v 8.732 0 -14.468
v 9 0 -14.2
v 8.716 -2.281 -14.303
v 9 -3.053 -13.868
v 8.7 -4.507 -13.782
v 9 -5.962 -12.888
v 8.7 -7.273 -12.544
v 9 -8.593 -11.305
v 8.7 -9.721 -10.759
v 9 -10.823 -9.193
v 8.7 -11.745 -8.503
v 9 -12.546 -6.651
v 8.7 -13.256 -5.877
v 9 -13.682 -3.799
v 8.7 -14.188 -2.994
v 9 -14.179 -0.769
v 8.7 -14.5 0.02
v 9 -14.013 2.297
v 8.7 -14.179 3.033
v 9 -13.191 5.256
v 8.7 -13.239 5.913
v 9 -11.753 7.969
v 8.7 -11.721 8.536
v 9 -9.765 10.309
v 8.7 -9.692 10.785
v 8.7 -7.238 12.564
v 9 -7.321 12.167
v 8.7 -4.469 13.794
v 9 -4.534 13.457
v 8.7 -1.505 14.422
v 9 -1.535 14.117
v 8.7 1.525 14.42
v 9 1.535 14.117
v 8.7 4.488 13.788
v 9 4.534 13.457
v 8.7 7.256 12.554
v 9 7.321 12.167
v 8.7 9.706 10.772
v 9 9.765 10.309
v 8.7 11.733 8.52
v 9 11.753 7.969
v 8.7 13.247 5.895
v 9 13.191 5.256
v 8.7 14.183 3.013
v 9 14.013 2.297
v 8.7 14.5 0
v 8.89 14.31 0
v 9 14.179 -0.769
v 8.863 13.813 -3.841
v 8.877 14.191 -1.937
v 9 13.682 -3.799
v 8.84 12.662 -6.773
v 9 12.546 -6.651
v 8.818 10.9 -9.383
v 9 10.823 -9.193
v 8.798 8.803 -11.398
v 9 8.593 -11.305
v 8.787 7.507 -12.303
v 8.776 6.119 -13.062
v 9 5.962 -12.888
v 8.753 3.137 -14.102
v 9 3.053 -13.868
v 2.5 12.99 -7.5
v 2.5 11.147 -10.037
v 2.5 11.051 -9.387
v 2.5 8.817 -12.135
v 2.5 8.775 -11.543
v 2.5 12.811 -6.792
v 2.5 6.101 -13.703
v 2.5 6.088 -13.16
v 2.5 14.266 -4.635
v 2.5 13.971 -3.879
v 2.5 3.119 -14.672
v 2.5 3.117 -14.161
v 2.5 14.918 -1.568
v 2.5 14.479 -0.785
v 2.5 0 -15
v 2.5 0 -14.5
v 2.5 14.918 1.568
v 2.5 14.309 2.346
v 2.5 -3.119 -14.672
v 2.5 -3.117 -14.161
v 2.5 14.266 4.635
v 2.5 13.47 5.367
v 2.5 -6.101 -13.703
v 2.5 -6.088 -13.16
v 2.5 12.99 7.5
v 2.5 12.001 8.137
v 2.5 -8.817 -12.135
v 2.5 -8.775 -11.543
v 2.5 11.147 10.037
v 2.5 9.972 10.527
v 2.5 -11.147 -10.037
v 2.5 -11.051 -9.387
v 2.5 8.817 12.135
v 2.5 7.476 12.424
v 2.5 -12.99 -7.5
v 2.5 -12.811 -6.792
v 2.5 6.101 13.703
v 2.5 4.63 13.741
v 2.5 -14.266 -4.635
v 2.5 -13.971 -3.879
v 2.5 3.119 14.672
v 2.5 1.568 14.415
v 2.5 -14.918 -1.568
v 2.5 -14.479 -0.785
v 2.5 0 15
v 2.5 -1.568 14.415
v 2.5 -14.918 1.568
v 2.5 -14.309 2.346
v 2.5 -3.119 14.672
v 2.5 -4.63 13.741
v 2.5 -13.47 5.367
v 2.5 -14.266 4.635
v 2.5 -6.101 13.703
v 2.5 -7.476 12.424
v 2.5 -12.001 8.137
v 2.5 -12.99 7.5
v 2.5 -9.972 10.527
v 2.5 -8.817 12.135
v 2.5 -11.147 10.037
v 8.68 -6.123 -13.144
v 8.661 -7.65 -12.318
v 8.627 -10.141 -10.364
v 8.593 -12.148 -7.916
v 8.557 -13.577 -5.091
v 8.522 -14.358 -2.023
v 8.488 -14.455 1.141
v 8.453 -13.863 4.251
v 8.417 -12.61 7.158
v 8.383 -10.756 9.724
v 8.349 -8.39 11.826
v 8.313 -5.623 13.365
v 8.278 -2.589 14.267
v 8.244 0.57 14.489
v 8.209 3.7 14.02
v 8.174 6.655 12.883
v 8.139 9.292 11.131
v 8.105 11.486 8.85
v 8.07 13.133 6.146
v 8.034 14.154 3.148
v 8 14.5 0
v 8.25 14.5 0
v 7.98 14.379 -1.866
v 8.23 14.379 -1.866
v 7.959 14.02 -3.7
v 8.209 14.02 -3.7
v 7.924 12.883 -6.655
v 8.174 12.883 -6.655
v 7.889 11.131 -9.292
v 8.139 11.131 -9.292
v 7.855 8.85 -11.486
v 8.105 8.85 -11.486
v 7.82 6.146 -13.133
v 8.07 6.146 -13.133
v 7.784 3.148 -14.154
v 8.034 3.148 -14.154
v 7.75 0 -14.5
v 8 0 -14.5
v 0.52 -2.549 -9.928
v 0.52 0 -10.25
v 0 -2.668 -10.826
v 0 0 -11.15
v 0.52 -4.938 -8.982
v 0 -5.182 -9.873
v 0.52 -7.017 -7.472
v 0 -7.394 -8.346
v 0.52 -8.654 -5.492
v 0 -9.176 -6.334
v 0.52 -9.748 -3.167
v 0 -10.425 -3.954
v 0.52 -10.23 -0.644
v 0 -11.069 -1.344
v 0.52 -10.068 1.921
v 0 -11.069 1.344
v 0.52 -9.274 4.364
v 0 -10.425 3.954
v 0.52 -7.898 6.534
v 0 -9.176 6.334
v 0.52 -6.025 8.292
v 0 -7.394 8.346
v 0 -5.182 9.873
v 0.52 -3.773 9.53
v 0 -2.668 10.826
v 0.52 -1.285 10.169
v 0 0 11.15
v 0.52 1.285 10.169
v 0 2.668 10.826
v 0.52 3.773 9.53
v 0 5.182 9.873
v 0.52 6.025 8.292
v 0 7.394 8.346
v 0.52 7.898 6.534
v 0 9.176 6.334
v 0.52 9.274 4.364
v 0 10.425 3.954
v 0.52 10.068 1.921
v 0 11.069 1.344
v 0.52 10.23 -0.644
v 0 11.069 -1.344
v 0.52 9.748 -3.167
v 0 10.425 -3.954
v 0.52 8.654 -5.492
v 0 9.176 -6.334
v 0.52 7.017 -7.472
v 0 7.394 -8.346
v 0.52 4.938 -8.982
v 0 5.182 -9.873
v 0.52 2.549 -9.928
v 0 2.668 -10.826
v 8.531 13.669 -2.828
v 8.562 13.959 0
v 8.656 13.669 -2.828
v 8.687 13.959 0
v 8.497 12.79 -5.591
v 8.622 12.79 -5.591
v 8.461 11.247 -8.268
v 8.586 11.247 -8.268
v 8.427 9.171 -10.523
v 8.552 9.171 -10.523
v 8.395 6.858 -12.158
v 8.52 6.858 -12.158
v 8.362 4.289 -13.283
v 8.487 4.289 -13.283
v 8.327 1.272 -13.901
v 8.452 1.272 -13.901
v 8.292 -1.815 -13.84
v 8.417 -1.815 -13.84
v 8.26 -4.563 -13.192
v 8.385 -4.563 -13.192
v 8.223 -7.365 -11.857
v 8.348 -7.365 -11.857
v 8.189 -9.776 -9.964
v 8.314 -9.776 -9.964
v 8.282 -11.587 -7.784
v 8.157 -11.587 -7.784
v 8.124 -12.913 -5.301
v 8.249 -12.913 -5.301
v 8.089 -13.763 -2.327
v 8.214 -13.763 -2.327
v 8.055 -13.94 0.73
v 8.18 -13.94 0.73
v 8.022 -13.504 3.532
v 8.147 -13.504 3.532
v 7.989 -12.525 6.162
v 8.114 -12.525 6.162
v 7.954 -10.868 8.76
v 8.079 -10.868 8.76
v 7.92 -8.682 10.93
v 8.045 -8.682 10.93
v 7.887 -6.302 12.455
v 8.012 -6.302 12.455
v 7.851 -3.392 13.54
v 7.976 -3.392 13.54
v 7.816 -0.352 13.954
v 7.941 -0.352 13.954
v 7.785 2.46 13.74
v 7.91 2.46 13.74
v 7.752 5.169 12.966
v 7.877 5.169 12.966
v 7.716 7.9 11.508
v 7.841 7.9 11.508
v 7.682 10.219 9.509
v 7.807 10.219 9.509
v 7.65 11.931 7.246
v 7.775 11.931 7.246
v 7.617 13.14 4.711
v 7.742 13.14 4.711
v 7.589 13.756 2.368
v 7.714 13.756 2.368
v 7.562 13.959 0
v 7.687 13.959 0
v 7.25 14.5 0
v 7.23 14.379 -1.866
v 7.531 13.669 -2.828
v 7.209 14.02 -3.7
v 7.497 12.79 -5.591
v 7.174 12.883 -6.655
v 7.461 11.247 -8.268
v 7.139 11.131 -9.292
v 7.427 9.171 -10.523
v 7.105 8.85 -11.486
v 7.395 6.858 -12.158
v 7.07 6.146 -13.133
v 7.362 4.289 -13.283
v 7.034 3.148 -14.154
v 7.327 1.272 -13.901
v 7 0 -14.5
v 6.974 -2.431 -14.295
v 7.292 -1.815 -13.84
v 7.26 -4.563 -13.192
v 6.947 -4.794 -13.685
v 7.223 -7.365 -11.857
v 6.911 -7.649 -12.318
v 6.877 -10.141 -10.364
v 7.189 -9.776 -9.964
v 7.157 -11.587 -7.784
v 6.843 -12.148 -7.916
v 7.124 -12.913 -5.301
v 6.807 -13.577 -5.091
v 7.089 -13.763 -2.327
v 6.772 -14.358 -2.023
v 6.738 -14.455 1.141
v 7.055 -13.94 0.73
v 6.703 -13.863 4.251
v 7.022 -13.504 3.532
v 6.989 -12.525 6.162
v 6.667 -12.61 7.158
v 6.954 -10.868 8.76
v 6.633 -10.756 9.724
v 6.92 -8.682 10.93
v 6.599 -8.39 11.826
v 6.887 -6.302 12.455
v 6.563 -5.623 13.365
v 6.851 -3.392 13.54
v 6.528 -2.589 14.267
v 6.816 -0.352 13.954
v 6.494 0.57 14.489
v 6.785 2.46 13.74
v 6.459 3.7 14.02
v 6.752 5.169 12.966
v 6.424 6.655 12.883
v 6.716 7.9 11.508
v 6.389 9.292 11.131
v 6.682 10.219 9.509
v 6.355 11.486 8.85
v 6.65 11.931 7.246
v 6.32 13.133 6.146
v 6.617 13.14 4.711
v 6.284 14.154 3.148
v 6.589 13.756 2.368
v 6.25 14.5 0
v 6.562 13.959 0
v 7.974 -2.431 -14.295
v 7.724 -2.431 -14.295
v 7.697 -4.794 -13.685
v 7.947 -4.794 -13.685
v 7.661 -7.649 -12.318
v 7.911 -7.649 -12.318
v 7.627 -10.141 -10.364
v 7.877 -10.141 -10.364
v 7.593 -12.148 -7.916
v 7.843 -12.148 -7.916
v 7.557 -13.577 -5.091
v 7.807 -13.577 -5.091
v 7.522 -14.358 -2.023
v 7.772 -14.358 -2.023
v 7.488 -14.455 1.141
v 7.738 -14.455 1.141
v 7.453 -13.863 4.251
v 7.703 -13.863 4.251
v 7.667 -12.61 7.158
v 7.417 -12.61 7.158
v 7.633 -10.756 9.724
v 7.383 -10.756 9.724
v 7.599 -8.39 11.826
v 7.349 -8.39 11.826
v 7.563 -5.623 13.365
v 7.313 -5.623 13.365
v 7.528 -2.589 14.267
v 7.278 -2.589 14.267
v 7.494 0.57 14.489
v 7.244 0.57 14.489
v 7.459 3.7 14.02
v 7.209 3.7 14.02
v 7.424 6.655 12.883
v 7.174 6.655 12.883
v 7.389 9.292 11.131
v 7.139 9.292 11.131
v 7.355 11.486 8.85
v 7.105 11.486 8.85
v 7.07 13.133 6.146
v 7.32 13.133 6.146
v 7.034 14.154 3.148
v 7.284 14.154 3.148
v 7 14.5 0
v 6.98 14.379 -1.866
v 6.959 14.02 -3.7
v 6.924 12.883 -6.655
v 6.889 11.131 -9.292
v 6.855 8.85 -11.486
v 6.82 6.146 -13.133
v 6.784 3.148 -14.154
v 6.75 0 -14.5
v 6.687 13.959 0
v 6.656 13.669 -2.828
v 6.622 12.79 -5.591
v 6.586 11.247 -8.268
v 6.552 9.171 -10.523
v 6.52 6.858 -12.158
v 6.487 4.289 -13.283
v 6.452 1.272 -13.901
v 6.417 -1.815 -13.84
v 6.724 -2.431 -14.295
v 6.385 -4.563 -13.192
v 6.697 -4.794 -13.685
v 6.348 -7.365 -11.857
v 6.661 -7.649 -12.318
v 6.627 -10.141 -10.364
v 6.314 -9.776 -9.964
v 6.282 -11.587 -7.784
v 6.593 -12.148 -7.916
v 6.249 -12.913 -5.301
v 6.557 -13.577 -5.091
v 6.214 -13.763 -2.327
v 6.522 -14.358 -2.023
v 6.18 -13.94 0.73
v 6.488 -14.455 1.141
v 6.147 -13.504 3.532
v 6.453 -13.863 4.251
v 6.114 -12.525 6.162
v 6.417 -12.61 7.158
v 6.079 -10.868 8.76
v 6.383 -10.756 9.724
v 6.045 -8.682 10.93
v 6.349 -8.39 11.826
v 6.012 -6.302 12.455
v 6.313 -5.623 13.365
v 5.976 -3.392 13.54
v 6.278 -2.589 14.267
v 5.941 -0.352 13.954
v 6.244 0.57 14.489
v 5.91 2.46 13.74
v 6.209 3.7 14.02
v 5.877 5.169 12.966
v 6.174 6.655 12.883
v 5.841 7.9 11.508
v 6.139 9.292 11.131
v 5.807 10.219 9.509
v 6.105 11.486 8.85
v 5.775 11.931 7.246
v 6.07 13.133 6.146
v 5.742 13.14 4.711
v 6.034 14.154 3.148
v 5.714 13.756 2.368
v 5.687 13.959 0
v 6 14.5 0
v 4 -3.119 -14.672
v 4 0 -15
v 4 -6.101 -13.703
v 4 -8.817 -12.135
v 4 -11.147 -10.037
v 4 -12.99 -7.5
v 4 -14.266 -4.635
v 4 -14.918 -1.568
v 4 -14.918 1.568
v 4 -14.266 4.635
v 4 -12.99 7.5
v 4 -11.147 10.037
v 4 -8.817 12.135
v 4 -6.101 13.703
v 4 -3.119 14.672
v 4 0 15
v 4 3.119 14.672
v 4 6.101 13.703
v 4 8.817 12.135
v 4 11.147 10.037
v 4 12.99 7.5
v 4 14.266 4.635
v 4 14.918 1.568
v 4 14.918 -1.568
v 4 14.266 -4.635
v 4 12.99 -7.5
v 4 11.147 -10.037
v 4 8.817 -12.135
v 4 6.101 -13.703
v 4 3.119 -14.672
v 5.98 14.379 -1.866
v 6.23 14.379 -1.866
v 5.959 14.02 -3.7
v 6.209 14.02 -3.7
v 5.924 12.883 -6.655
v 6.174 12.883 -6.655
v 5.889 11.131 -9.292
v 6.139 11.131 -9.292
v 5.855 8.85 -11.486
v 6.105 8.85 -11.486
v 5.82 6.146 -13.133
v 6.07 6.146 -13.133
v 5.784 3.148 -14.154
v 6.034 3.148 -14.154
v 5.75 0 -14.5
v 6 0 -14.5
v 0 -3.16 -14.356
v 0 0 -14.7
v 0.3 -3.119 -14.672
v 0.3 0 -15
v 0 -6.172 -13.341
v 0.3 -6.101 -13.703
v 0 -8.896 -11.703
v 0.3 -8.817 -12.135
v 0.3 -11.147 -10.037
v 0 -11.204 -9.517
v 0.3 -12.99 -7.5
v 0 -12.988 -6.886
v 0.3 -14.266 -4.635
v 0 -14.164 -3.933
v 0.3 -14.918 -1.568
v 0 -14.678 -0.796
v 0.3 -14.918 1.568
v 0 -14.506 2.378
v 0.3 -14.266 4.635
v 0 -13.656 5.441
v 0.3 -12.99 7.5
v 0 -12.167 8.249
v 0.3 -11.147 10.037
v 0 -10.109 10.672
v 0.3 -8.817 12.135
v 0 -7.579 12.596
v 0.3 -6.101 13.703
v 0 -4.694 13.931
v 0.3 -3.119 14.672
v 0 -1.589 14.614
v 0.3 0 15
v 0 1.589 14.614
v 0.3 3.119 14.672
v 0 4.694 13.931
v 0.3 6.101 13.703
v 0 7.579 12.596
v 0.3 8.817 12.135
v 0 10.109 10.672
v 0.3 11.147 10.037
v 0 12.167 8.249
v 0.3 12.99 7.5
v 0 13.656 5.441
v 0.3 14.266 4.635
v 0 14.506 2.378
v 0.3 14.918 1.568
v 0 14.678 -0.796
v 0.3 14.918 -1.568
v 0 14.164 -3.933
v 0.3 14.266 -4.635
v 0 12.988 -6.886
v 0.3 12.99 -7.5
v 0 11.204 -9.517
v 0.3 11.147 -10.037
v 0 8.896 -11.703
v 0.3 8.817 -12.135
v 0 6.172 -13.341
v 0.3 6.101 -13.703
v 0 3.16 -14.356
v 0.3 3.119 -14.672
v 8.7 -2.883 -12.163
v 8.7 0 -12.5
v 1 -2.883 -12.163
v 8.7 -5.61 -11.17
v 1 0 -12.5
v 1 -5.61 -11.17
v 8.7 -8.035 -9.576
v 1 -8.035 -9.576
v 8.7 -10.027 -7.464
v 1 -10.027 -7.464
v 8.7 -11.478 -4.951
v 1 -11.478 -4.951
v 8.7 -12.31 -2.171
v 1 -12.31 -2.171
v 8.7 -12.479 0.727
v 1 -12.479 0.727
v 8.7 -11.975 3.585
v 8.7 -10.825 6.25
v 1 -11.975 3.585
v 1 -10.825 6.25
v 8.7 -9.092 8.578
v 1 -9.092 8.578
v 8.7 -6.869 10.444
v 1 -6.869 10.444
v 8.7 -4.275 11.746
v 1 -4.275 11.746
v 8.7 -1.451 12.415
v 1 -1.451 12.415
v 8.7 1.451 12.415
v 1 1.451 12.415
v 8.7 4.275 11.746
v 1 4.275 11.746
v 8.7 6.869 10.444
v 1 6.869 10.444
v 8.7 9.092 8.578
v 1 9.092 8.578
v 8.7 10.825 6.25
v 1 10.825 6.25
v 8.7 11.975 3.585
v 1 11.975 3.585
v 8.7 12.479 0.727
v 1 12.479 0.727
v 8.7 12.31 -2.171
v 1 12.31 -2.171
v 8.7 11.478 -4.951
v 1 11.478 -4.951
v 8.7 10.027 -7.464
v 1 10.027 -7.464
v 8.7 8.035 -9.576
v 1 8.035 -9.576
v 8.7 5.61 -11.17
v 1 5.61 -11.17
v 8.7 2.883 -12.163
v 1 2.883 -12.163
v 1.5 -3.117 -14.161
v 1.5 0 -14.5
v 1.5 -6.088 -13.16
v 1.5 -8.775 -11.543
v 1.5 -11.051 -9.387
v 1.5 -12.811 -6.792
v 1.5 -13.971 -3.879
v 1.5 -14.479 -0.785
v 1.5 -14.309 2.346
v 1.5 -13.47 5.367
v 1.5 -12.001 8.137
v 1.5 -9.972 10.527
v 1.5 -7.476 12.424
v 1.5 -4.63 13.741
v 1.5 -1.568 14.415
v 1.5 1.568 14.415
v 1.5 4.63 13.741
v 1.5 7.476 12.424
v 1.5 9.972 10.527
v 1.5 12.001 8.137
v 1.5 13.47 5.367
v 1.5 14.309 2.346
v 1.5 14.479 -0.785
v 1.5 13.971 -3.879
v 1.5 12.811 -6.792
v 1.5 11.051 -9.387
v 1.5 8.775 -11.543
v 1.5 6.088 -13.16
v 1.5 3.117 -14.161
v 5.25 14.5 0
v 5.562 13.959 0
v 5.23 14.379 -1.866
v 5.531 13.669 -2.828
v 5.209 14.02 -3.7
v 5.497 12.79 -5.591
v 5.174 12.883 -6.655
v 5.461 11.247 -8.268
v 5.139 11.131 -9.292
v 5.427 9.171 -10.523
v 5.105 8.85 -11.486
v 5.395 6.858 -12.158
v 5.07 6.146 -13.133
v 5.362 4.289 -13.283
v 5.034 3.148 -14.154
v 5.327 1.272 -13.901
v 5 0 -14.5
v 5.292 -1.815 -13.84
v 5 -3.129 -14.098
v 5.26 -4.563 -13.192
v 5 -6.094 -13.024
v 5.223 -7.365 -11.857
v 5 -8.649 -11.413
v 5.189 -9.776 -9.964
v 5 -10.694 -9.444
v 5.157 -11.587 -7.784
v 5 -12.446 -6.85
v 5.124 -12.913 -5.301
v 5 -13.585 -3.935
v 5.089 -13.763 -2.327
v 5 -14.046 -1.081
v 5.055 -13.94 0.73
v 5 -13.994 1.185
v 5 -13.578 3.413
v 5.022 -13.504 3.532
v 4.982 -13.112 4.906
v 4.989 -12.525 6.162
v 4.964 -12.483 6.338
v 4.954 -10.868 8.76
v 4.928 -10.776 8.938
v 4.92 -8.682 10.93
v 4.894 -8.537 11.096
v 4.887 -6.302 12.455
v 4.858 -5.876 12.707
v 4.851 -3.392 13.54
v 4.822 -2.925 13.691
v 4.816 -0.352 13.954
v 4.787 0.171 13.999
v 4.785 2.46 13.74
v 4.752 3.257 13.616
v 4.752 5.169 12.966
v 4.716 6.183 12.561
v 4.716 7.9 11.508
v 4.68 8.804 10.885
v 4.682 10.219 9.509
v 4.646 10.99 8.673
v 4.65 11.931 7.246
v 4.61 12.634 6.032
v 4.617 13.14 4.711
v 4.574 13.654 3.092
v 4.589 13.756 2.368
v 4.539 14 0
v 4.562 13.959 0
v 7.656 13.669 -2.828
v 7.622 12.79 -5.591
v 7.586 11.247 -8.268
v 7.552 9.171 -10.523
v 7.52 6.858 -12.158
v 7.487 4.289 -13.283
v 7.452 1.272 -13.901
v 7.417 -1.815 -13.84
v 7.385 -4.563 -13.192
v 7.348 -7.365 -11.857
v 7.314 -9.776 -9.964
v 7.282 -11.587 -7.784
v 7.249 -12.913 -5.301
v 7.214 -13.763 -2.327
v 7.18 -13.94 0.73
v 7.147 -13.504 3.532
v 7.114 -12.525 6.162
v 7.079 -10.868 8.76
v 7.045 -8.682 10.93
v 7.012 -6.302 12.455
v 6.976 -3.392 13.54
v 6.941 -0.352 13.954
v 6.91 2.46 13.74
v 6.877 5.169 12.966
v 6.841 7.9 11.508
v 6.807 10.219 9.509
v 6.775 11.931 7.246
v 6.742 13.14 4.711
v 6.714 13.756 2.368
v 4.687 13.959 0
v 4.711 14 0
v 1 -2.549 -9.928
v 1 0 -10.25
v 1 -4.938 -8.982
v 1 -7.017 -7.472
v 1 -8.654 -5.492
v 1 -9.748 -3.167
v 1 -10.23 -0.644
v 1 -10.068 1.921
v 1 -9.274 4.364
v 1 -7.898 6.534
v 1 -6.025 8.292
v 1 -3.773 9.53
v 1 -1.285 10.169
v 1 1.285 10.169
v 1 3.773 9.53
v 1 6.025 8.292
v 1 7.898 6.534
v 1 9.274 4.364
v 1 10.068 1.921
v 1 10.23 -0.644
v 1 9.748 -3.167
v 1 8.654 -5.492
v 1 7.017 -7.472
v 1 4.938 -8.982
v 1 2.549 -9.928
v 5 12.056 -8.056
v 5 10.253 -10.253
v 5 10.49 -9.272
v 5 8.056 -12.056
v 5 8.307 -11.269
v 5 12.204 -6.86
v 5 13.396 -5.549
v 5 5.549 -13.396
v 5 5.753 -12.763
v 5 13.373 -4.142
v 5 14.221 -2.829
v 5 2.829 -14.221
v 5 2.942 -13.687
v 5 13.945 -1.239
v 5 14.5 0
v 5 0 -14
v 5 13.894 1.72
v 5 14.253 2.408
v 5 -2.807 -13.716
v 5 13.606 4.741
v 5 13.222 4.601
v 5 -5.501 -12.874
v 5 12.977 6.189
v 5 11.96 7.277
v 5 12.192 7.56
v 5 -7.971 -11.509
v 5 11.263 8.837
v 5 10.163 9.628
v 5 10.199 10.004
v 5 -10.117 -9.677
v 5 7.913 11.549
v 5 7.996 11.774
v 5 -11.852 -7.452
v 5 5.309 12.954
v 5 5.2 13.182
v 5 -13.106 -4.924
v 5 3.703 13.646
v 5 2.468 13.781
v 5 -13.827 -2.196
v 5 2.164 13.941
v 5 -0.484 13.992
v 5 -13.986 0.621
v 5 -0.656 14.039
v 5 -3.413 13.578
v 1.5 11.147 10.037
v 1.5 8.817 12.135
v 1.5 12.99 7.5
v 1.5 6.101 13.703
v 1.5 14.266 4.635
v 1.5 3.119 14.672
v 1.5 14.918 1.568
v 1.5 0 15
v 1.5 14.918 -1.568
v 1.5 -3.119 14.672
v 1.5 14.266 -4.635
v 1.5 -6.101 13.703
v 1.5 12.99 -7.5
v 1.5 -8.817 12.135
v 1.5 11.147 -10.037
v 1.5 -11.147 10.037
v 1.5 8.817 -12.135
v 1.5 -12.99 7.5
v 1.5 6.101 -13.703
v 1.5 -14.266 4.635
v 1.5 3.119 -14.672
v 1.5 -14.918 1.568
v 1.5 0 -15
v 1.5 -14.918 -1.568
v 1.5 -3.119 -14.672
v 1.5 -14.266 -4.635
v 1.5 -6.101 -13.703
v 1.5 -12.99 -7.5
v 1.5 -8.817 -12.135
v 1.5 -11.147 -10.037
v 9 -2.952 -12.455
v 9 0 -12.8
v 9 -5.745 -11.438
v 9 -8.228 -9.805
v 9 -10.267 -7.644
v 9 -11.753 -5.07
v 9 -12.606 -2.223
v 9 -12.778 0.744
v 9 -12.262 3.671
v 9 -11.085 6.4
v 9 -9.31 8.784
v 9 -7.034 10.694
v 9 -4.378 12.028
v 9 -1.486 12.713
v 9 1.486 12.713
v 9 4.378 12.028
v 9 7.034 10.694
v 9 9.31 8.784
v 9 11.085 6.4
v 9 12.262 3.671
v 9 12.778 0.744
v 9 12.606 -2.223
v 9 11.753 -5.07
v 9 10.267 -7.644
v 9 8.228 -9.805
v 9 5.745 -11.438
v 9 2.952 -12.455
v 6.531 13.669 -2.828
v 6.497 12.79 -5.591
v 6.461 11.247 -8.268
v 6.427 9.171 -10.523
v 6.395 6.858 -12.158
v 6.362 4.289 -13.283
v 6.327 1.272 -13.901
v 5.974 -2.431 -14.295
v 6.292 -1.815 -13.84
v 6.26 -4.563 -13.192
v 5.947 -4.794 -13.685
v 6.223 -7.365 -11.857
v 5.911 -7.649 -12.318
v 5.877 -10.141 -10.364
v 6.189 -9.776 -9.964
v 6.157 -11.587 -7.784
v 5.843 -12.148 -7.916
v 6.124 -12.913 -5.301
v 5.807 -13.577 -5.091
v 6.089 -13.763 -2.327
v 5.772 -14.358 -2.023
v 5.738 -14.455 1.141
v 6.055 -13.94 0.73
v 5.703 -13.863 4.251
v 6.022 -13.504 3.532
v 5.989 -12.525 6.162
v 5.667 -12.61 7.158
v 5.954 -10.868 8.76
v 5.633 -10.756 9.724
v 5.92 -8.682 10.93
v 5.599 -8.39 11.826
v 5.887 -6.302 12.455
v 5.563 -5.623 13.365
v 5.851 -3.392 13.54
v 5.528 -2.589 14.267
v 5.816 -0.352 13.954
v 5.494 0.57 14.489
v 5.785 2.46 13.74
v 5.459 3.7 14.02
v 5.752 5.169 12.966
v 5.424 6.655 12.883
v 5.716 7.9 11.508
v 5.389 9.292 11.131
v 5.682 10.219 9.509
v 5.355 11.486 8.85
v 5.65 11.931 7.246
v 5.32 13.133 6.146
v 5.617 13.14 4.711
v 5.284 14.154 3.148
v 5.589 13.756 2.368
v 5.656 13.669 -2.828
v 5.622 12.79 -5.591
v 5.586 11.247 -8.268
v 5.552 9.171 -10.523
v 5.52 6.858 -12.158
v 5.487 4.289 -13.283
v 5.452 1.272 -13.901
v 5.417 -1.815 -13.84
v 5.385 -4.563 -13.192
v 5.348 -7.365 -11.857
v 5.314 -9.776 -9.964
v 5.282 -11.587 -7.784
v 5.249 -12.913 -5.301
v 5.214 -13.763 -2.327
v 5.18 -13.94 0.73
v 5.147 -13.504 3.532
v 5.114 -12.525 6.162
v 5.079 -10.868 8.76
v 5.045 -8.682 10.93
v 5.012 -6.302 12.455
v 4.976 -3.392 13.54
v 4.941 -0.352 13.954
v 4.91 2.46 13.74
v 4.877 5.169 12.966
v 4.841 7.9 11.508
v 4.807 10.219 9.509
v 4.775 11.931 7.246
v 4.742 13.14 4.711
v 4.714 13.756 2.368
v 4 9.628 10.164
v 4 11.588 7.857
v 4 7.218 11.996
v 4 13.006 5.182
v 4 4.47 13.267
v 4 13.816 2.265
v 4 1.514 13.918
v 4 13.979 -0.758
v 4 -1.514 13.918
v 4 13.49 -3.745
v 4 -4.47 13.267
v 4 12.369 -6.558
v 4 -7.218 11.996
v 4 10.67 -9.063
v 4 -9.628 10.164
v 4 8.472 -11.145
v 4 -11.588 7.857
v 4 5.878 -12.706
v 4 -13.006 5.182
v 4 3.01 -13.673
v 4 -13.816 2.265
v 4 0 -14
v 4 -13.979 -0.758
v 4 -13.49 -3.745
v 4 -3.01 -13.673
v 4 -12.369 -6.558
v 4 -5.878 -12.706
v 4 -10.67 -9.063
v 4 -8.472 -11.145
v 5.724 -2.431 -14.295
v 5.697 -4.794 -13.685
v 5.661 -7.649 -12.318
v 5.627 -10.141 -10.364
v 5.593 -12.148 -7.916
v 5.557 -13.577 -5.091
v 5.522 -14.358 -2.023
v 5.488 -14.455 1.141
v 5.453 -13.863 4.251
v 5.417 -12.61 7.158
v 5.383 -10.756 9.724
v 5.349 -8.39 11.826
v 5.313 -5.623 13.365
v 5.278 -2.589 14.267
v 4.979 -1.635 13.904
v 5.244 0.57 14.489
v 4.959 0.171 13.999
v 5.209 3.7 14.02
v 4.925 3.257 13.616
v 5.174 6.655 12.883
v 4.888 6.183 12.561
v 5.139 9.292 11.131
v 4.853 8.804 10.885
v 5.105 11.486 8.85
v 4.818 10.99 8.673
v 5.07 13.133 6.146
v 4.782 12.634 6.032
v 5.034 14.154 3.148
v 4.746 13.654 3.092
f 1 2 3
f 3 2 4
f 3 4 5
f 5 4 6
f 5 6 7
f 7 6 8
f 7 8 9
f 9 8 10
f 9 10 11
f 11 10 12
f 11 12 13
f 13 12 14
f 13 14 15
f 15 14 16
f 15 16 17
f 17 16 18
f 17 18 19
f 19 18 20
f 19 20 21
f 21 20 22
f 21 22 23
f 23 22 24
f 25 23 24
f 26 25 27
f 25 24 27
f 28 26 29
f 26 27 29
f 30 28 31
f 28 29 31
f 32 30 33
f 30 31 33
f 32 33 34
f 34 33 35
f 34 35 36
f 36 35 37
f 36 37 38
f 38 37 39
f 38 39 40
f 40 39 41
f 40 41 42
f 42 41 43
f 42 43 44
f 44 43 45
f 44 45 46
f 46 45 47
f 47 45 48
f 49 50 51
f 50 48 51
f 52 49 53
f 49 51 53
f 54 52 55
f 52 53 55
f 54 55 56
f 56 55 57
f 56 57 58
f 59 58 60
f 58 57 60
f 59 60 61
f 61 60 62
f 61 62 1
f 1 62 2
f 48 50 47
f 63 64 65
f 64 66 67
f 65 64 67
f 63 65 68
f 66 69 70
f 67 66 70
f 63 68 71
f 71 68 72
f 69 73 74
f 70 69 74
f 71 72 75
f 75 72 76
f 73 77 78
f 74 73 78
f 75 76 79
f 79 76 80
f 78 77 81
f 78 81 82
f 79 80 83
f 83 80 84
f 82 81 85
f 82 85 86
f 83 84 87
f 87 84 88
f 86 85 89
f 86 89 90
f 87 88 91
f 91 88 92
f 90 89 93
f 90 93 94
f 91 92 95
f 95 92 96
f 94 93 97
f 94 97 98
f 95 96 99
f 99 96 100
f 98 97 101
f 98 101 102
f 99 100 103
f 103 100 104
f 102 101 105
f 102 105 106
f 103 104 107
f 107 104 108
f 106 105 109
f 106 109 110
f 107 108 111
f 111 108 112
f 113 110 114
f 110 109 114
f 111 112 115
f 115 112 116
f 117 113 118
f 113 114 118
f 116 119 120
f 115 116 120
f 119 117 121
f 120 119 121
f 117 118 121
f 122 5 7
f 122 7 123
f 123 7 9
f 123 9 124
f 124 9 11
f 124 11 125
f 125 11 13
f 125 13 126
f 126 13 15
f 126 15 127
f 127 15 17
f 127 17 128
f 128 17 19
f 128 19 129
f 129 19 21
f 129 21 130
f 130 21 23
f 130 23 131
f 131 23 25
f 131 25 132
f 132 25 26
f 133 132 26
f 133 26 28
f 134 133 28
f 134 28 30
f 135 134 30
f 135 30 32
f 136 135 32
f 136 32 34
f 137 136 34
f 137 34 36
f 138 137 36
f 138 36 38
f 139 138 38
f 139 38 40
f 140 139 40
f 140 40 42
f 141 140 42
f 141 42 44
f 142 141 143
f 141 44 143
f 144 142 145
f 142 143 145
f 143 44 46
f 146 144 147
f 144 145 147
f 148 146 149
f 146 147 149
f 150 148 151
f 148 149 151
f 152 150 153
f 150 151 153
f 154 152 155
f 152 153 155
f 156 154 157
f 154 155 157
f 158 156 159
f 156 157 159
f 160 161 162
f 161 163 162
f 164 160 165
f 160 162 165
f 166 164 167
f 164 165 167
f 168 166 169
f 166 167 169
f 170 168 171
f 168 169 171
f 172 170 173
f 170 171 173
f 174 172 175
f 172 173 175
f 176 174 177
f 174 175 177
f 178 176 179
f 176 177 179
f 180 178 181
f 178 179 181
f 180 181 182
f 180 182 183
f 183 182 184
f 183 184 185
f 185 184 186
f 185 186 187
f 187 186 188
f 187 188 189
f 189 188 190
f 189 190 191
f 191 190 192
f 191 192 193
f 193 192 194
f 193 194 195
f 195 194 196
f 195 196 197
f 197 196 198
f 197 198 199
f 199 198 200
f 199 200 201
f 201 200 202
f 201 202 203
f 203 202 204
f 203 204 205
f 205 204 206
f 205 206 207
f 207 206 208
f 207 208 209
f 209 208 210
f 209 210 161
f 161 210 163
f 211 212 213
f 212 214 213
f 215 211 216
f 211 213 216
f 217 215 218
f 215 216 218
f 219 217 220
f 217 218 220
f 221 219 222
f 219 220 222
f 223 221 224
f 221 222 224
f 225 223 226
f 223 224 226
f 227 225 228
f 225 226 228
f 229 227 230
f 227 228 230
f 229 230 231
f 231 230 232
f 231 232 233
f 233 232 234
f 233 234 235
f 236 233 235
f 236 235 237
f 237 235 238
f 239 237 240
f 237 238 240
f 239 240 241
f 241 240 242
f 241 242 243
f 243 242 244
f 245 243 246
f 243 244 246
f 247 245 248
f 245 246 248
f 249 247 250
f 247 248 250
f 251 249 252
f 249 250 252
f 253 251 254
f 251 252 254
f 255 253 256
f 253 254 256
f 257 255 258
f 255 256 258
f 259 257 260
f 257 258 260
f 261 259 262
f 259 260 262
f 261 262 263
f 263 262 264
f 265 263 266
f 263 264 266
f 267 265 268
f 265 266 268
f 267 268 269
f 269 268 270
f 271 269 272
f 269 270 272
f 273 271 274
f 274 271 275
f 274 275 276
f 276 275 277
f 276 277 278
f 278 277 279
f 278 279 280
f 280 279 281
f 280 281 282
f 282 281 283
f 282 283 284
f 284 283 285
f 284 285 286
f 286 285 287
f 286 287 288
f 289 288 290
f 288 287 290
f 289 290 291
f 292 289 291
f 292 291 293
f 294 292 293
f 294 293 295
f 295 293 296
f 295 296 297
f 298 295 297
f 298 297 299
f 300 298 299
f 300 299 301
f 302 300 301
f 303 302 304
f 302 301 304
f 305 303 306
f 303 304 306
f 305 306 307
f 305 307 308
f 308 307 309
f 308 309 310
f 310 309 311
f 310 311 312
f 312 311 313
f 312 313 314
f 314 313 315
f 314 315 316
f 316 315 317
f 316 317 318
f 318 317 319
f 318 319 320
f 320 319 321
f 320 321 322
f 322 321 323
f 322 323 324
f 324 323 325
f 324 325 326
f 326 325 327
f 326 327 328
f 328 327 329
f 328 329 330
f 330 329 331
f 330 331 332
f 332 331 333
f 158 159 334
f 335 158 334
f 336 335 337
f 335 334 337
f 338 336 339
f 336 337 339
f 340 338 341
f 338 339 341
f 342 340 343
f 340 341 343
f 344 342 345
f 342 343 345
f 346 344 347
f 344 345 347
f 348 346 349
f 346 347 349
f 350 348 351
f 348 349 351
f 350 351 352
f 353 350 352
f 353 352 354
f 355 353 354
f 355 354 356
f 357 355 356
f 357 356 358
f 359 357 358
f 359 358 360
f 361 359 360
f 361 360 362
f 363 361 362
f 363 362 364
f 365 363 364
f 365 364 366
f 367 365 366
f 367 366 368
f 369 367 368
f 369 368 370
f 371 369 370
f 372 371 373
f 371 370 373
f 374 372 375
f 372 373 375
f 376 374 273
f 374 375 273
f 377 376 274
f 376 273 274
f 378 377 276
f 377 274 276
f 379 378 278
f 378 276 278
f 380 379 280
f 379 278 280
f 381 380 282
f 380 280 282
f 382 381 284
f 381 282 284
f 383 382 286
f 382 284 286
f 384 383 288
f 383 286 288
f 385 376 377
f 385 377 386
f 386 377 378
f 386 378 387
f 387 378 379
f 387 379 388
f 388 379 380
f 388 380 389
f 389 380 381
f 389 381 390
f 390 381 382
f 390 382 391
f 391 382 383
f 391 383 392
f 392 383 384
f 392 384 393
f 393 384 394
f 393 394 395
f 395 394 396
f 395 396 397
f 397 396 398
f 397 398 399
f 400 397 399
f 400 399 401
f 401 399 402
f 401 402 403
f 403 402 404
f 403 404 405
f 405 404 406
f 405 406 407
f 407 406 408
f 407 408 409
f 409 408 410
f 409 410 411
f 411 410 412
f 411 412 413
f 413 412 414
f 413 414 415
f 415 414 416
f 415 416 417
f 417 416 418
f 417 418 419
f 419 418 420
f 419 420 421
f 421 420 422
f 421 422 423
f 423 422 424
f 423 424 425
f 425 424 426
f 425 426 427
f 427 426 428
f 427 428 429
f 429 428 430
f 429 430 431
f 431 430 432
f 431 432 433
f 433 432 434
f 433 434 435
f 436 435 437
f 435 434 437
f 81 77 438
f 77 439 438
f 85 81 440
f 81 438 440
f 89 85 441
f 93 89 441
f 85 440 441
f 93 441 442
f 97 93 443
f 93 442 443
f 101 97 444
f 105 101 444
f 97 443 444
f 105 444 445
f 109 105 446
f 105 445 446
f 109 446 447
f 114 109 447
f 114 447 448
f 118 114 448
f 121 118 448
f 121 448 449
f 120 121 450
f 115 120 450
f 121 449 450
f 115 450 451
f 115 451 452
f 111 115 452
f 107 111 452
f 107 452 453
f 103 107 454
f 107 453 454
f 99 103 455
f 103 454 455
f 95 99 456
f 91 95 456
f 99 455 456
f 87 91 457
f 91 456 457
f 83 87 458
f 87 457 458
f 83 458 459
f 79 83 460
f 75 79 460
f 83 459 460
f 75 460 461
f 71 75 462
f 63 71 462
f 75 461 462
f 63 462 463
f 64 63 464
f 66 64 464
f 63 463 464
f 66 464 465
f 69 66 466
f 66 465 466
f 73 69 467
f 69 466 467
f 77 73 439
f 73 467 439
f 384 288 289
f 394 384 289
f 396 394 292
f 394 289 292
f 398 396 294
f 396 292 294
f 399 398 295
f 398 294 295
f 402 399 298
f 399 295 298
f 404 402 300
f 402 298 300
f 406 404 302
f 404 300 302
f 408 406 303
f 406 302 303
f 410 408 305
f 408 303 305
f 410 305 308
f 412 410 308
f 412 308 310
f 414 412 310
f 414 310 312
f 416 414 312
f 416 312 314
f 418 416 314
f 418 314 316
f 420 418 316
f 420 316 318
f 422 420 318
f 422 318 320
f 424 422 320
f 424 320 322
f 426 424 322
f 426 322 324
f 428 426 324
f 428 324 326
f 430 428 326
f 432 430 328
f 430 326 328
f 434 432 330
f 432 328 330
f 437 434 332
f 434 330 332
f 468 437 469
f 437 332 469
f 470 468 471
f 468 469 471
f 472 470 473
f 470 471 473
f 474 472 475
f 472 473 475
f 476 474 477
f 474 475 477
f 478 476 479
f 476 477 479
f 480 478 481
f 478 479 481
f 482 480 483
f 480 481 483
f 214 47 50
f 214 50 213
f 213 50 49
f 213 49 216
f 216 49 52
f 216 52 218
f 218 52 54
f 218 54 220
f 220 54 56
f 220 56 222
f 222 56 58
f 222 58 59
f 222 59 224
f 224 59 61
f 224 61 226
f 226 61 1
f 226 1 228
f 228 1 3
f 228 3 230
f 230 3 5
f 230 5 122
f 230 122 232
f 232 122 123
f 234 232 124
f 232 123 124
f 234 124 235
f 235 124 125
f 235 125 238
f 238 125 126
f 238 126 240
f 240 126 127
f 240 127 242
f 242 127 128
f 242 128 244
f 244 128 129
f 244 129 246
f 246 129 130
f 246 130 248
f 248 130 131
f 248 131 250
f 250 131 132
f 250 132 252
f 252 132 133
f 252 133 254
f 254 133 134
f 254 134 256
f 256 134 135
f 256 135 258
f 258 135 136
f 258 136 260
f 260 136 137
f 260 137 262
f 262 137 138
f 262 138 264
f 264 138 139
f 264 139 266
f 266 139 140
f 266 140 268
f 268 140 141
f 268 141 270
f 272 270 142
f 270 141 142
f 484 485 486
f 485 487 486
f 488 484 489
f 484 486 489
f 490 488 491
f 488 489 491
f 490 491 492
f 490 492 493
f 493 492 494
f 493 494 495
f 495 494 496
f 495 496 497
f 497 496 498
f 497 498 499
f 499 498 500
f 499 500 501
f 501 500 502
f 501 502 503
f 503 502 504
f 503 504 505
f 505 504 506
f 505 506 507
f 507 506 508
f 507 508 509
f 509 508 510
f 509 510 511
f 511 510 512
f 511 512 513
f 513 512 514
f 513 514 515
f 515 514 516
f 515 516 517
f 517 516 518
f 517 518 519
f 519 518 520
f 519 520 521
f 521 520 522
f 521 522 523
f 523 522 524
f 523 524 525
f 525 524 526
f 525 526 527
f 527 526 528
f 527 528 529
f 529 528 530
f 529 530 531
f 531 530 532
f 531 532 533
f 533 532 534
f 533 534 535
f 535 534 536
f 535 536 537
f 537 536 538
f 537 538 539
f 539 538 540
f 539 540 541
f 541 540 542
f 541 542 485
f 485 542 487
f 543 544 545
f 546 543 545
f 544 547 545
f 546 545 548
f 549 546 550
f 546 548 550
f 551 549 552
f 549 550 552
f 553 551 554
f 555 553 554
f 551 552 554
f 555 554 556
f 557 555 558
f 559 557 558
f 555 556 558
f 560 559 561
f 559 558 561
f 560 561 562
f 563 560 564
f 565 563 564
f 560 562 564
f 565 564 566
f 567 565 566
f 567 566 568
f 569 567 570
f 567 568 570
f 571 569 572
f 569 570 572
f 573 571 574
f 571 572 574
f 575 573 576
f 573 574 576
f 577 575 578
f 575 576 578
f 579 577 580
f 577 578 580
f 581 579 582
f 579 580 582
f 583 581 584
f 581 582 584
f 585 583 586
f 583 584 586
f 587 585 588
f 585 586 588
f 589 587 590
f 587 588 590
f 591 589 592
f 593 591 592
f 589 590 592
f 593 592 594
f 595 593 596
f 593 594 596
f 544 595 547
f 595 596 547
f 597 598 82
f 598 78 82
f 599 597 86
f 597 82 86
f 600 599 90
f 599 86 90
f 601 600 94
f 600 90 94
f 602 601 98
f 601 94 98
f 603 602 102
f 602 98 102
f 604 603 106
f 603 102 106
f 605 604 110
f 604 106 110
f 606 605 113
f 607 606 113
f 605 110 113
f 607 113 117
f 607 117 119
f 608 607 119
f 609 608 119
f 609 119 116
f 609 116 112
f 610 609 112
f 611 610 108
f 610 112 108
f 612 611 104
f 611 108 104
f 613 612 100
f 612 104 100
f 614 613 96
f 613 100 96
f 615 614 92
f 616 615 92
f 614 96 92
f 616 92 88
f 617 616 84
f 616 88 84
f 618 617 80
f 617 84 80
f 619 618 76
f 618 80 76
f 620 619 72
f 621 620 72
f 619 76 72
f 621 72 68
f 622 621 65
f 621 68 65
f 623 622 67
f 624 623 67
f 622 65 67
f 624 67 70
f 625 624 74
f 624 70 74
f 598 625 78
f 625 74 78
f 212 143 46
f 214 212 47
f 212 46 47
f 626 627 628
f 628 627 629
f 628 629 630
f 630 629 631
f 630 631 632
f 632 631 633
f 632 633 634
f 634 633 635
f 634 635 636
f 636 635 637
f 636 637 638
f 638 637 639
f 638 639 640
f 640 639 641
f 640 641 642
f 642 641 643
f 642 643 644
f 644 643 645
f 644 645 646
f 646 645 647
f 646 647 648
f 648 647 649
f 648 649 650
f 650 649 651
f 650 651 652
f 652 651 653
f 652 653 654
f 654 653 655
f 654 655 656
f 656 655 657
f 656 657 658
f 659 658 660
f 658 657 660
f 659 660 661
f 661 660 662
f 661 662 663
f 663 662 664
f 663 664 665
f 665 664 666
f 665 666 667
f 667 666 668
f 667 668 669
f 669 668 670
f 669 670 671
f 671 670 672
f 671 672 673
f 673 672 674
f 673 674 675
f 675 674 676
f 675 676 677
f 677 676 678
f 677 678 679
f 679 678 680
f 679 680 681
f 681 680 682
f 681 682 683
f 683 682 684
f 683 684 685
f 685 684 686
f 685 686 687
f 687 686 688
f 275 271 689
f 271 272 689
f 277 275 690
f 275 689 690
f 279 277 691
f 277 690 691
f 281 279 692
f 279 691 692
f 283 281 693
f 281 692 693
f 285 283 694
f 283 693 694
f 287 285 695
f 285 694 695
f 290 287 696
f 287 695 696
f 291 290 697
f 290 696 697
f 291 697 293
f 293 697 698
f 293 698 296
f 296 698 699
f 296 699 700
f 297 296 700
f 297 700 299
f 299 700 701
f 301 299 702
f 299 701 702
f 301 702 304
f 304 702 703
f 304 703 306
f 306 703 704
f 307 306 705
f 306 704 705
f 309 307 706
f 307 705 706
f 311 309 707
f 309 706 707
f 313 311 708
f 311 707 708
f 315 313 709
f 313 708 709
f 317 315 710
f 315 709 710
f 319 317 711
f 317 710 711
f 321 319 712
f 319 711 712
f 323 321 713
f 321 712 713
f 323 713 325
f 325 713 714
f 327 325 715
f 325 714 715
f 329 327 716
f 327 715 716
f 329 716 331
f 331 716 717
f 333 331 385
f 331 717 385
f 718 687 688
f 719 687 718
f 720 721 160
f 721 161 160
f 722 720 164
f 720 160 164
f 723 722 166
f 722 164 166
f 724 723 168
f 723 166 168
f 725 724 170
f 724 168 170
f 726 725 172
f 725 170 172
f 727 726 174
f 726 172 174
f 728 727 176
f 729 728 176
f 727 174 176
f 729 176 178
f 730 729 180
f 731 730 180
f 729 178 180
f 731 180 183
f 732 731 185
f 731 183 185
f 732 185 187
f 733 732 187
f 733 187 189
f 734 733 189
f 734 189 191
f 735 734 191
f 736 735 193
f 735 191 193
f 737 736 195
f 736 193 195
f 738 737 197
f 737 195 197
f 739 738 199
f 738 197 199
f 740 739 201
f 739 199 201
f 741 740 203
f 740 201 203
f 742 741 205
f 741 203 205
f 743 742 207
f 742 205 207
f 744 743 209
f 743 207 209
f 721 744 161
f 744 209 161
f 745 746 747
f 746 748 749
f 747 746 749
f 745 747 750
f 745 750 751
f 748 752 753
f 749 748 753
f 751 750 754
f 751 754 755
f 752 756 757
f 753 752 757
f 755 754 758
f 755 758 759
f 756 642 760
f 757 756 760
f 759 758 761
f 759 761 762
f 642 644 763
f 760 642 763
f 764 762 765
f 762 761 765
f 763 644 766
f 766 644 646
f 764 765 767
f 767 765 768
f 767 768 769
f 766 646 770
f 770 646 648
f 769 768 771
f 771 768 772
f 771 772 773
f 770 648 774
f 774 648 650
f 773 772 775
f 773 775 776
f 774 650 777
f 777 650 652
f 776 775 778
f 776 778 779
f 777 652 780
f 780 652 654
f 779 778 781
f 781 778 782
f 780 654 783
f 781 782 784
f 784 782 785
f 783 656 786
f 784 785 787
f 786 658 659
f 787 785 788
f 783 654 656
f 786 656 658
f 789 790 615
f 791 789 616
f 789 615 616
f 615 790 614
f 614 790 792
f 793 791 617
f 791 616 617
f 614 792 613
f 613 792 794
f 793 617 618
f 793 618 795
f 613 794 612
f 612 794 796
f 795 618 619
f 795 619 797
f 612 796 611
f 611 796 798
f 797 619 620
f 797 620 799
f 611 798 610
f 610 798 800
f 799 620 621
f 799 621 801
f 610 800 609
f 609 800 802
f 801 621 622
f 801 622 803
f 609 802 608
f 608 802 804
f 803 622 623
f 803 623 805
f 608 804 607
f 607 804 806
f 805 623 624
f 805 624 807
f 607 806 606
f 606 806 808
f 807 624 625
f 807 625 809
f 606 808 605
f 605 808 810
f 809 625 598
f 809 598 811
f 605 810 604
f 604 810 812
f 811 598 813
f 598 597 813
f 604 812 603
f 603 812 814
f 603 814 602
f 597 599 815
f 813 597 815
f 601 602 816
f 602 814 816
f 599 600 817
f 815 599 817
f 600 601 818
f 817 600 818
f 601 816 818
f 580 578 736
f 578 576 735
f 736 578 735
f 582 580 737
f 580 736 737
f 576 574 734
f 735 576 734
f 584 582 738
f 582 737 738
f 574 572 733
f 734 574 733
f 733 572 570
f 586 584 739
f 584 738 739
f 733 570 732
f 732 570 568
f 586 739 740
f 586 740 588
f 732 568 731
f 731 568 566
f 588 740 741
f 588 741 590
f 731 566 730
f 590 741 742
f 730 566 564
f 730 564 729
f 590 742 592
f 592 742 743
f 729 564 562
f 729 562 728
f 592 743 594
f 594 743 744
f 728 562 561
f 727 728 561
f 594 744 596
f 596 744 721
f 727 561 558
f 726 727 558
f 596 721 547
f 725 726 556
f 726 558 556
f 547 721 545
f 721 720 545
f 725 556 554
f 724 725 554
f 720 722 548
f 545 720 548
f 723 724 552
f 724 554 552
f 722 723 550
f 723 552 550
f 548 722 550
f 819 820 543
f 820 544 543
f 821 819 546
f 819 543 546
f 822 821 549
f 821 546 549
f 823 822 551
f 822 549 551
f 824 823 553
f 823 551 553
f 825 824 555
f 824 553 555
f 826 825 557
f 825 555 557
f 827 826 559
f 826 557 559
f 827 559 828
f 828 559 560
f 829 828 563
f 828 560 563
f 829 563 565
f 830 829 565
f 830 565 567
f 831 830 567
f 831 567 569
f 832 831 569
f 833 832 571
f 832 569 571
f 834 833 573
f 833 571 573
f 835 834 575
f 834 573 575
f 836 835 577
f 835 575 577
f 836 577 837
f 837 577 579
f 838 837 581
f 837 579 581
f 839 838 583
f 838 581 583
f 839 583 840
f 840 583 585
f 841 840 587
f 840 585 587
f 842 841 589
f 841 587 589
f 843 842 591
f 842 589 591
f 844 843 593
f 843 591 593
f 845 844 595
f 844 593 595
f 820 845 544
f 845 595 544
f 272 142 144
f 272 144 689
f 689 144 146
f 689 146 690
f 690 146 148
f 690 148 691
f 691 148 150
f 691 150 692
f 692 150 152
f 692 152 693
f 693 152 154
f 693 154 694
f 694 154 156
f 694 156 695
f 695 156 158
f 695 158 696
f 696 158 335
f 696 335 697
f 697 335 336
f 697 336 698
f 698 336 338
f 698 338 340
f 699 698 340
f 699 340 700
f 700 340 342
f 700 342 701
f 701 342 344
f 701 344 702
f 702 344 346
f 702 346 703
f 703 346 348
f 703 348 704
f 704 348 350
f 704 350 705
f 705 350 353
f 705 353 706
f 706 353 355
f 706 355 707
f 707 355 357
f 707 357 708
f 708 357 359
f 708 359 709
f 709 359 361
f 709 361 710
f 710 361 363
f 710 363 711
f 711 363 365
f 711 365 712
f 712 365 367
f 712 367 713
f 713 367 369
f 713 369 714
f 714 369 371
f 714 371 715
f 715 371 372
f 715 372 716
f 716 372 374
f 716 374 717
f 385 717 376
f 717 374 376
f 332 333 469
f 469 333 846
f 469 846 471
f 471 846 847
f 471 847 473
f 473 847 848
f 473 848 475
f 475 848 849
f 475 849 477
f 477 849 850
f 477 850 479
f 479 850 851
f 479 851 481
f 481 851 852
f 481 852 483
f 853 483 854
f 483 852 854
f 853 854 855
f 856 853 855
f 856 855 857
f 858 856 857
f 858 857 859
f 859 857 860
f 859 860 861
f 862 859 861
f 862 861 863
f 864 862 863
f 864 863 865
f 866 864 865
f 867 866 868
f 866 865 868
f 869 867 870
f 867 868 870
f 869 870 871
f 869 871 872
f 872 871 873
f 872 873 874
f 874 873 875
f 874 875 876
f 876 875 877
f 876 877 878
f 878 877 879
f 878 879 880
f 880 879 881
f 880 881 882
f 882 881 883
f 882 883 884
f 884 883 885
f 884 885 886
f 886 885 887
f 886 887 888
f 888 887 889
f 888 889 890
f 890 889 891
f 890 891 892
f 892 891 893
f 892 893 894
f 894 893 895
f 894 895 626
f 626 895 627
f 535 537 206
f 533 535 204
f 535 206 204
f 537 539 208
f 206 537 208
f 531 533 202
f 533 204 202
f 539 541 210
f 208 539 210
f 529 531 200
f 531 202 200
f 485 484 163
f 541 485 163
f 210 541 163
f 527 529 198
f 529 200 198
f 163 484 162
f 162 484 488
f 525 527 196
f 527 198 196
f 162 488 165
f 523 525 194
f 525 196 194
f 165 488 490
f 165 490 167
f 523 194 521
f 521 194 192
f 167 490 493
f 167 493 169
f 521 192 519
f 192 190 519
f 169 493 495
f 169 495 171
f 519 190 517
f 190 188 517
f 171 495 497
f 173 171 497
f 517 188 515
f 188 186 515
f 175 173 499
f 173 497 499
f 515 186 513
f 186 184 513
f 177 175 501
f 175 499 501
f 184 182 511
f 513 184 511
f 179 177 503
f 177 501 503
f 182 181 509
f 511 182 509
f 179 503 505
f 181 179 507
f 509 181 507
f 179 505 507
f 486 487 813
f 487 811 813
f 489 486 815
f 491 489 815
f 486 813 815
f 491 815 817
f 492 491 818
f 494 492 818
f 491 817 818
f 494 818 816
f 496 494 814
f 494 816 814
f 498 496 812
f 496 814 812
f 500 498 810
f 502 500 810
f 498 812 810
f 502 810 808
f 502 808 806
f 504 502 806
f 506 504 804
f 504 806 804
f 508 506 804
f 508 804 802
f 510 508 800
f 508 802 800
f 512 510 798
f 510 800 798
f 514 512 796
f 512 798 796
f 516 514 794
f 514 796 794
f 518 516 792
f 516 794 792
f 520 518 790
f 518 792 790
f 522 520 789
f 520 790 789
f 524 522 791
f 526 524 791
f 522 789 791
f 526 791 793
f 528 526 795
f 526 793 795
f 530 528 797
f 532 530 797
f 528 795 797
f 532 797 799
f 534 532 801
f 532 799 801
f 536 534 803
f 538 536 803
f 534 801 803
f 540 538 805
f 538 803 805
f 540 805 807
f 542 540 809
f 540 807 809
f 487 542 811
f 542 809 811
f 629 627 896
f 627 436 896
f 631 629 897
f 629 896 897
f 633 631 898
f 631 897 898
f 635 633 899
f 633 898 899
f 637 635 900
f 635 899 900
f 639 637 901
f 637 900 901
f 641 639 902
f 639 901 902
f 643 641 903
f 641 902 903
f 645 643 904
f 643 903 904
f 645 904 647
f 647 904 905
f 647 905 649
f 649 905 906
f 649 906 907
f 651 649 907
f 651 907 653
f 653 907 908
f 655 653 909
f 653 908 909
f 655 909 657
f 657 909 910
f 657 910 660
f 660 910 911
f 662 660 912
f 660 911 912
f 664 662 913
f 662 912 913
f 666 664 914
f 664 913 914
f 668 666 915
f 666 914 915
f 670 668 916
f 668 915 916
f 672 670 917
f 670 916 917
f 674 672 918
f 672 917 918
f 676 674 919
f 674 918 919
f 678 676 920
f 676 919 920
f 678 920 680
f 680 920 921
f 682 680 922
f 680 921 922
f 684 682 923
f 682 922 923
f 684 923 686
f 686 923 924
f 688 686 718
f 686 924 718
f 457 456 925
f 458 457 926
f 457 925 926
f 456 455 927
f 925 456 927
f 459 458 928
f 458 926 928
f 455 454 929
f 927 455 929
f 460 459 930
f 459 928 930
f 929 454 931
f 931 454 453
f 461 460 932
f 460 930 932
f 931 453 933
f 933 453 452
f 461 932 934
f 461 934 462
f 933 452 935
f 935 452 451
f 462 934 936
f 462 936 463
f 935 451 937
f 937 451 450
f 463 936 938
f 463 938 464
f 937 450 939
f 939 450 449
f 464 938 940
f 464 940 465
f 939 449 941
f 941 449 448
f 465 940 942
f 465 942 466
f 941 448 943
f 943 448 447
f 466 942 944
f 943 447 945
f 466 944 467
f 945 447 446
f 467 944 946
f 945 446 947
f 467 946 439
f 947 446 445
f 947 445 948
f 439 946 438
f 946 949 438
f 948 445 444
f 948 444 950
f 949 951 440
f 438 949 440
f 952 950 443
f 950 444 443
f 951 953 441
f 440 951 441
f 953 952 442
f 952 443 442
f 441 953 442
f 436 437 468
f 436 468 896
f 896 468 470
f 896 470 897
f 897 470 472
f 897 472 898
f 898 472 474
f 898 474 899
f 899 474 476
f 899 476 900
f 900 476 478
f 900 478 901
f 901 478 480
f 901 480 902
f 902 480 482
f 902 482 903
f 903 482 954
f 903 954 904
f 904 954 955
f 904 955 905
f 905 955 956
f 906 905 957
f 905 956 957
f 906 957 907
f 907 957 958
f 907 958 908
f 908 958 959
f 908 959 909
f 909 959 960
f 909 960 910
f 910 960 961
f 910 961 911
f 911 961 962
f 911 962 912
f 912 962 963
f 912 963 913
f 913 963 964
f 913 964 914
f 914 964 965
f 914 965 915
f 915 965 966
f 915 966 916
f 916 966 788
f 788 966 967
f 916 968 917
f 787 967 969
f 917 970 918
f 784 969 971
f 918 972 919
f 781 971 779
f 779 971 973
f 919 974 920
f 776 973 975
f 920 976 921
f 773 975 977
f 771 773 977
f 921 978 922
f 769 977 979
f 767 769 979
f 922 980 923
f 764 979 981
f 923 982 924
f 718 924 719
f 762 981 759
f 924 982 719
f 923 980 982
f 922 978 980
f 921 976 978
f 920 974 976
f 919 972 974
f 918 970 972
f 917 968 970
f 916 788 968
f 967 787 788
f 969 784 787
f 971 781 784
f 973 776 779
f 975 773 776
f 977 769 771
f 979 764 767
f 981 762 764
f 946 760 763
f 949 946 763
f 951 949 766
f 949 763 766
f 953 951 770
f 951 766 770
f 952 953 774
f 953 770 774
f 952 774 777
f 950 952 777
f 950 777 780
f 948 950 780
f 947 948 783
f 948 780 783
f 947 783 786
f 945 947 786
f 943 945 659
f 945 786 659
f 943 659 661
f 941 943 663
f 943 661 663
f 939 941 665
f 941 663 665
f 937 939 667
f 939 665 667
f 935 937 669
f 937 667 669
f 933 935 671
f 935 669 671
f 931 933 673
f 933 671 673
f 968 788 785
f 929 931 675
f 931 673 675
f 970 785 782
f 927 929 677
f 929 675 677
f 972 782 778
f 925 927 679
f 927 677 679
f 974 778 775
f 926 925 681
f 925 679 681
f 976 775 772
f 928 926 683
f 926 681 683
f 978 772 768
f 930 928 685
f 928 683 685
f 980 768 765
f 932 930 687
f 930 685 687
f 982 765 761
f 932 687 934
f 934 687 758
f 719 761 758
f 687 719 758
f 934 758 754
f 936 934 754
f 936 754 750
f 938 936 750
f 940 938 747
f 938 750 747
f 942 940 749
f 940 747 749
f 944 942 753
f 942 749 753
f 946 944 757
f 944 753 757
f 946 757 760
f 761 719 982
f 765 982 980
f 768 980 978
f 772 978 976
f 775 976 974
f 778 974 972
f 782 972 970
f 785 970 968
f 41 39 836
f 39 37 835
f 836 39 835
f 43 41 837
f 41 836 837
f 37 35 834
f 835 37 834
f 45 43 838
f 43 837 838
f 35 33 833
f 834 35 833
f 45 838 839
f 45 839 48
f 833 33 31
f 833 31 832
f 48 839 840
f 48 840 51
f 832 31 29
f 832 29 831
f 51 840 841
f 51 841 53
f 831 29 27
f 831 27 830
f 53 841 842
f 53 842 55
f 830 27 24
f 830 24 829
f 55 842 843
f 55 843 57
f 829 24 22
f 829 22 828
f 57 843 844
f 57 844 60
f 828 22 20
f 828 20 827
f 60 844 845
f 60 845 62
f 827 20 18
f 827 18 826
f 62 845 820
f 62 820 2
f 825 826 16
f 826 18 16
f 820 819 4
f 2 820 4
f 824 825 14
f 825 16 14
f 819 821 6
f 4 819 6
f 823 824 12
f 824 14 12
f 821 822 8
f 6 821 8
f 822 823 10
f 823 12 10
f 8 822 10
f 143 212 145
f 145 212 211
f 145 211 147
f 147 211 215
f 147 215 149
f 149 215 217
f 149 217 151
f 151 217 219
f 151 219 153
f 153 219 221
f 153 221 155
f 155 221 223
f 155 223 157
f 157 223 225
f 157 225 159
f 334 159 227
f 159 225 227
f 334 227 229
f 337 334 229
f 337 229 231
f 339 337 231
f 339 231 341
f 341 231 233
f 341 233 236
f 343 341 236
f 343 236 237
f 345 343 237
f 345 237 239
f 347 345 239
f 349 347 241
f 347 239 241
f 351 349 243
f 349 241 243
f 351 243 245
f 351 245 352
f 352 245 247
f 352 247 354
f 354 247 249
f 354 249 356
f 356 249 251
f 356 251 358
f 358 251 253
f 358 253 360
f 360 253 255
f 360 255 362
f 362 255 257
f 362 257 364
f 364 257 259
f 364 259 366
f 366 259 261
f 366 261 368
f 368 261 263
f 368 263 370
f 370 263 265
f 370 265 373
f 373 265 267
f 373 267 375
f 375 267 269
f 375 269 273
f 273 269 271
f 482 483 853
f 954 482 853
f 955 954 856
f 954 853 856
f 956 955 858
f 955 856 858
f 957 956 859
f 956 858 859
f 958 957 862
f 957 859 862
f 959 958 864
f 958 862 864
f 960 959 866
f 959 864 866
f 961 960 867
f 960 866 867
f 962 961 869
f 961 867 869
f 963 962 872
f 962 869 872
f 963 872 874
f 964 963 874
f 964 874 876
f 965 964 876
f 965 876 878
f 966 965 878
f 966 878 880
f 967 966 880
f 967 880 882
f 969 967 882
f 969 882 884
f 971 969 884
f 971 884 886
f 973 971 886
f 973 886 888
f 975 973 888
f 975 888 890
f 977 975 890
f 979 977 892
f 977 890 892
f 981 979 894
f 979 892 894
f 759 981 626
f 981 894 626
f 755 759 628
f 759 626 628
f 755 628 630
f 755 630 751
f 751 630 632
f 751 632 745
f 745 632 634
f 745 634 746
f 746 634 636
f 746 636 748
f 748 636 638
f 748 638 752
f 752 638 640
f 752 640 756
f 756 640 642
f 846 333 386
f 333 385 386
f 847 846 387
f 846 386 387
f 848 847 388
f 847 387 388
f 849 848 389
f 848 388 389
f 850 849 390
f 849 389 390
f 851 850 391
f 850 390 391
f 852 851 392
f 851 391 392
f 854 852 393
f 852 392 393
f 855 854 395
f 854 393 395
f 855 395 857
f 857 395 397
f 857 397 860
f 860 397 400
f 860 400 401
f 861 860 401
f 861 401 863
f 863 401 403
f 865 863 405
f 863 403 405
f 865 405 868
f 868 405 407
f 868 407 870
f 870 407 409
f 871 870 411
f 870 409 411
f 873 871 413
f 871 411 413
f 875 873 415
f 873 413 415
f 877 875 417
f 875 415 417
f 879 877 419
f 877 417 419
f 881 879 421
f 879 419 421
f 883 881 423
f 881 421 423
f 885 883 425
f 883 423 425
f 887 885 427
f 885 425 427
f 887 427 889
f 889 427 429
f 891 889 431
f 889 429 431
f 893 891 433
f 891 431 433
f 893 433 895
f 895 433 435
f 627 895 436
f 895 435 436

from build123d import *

# Parameters (mm, degrees)
THREAD2_PITCH = 1


with BuildPart() as part:
    # Sketch1 → Revolve1 (revolve)
    with BuildSketch(Plane.XY, mode=Mode.PRIVATE) as revolve1_sk:
        Polygon((0, -11.15), (0, -14.7), (0.3, -15), (1.5, -15), (1.5, -14.5), (2.5, -14.5), (2.5, -15), (4, -15), (4, -14), (5, -14), (5, -14.5), (8.7, -14.5), (9, -14.2), (9, -12.8), (8.7, -12.5), (1, -12.5), (1, -10.25), (0.519615242, -10.25), align=None)
    revolve(revolve1_sk.sketch.rotate(Axis((35.470277062, 0, 0), (-1, 0, 0)), 270), axis=Axis((35.470277062, 0, 0), (-1, 0, 0)))

    # Thread2: the profile of Thread Profile2 profile screwed along a right-hand helix of 4 turns, 8 arcs to a turn; built about Z, then put on its axis
    thread2_z = Axis((0, 0, 0), (0, 0, 1))
    thread2_corners = [(14.5003, 0, 0.750173208), (13.95873412, 0, 0.437500002), (13.95873412, 0, 0.312500002), (14.5003, 0, -0.000173205)]
    with BuildLine(mode=Mode.PRIVATE) as thread2_profile:
        Line(thread2_corners[0], thread2_corners[1])
        Line(thread2_corners[1], thread2_corners[2])
        Line(thread2_corners[2], thread2_corners[3])
        Line(thread2_corners[3], thread2_corners[0])
    thread2_cap = Face(thread2_profile.wire())
    thread2_turn_angles = [0, 22.5, 45, 67.5, 90, 112.5, 135, 157.5, 180, 202.5, 225, 247.5, 270, 292.5, 315, 337.5, 360]
    thread2_turn_weights = [1, 0.9238795325112867, 1, 0.9238795325112867, 1, 0.9238795325112867, 1, 0.9238795325112867, 1, 0.9238795325112867, 1, 0.9238795325112867, 1, 0.9238795325112867, 1, 0.9238795325112867, 1]
    thread2_turn_rails = [Edge.make_bspline([Vector(p[0], p[1], 0).rotate(thread2_z, thread2_turn_angles[k]) / thread2_turn_weights[k] + Vector(0, 0, p[2] + THREAD2_PITCH * thread2_turn_angles[k] / 360) for k in range(17)], [0, 0, 0, 1, 1, 2, 2, 3, 3, 4, 4, 5, 5, 6, 6, 7, 7, 8, 8, 8], 2, thread2_turn_weights) for p in thread2_corners]
    thread2_turn_sides = [Face.make_surface_from_curves(thread2_turn_rails[p[0]], thread2_turn_rails[p[1]]) for p in [(0, 1), (1, 2), (2, 3), (3, 0)]]
    thread2 = Plane(origin=(9, 0, 0), x_dir=(0, 1, 0), z_dir=(-1, 0, 0)) * Solid(Shell([*[p.moved(Location((0, 0, THREAD2_PITCH * i))) for i in range(4) for p in thread2_turn_sides], thread2_cap, thread2_cap.rotate(thread2_z, 1440).moved(Location((0, 0, THREAD2_PITCH * 1440 / 360)))]))
    add(thread2, mode=Mode.SUBTRACT)


solid = part.part
